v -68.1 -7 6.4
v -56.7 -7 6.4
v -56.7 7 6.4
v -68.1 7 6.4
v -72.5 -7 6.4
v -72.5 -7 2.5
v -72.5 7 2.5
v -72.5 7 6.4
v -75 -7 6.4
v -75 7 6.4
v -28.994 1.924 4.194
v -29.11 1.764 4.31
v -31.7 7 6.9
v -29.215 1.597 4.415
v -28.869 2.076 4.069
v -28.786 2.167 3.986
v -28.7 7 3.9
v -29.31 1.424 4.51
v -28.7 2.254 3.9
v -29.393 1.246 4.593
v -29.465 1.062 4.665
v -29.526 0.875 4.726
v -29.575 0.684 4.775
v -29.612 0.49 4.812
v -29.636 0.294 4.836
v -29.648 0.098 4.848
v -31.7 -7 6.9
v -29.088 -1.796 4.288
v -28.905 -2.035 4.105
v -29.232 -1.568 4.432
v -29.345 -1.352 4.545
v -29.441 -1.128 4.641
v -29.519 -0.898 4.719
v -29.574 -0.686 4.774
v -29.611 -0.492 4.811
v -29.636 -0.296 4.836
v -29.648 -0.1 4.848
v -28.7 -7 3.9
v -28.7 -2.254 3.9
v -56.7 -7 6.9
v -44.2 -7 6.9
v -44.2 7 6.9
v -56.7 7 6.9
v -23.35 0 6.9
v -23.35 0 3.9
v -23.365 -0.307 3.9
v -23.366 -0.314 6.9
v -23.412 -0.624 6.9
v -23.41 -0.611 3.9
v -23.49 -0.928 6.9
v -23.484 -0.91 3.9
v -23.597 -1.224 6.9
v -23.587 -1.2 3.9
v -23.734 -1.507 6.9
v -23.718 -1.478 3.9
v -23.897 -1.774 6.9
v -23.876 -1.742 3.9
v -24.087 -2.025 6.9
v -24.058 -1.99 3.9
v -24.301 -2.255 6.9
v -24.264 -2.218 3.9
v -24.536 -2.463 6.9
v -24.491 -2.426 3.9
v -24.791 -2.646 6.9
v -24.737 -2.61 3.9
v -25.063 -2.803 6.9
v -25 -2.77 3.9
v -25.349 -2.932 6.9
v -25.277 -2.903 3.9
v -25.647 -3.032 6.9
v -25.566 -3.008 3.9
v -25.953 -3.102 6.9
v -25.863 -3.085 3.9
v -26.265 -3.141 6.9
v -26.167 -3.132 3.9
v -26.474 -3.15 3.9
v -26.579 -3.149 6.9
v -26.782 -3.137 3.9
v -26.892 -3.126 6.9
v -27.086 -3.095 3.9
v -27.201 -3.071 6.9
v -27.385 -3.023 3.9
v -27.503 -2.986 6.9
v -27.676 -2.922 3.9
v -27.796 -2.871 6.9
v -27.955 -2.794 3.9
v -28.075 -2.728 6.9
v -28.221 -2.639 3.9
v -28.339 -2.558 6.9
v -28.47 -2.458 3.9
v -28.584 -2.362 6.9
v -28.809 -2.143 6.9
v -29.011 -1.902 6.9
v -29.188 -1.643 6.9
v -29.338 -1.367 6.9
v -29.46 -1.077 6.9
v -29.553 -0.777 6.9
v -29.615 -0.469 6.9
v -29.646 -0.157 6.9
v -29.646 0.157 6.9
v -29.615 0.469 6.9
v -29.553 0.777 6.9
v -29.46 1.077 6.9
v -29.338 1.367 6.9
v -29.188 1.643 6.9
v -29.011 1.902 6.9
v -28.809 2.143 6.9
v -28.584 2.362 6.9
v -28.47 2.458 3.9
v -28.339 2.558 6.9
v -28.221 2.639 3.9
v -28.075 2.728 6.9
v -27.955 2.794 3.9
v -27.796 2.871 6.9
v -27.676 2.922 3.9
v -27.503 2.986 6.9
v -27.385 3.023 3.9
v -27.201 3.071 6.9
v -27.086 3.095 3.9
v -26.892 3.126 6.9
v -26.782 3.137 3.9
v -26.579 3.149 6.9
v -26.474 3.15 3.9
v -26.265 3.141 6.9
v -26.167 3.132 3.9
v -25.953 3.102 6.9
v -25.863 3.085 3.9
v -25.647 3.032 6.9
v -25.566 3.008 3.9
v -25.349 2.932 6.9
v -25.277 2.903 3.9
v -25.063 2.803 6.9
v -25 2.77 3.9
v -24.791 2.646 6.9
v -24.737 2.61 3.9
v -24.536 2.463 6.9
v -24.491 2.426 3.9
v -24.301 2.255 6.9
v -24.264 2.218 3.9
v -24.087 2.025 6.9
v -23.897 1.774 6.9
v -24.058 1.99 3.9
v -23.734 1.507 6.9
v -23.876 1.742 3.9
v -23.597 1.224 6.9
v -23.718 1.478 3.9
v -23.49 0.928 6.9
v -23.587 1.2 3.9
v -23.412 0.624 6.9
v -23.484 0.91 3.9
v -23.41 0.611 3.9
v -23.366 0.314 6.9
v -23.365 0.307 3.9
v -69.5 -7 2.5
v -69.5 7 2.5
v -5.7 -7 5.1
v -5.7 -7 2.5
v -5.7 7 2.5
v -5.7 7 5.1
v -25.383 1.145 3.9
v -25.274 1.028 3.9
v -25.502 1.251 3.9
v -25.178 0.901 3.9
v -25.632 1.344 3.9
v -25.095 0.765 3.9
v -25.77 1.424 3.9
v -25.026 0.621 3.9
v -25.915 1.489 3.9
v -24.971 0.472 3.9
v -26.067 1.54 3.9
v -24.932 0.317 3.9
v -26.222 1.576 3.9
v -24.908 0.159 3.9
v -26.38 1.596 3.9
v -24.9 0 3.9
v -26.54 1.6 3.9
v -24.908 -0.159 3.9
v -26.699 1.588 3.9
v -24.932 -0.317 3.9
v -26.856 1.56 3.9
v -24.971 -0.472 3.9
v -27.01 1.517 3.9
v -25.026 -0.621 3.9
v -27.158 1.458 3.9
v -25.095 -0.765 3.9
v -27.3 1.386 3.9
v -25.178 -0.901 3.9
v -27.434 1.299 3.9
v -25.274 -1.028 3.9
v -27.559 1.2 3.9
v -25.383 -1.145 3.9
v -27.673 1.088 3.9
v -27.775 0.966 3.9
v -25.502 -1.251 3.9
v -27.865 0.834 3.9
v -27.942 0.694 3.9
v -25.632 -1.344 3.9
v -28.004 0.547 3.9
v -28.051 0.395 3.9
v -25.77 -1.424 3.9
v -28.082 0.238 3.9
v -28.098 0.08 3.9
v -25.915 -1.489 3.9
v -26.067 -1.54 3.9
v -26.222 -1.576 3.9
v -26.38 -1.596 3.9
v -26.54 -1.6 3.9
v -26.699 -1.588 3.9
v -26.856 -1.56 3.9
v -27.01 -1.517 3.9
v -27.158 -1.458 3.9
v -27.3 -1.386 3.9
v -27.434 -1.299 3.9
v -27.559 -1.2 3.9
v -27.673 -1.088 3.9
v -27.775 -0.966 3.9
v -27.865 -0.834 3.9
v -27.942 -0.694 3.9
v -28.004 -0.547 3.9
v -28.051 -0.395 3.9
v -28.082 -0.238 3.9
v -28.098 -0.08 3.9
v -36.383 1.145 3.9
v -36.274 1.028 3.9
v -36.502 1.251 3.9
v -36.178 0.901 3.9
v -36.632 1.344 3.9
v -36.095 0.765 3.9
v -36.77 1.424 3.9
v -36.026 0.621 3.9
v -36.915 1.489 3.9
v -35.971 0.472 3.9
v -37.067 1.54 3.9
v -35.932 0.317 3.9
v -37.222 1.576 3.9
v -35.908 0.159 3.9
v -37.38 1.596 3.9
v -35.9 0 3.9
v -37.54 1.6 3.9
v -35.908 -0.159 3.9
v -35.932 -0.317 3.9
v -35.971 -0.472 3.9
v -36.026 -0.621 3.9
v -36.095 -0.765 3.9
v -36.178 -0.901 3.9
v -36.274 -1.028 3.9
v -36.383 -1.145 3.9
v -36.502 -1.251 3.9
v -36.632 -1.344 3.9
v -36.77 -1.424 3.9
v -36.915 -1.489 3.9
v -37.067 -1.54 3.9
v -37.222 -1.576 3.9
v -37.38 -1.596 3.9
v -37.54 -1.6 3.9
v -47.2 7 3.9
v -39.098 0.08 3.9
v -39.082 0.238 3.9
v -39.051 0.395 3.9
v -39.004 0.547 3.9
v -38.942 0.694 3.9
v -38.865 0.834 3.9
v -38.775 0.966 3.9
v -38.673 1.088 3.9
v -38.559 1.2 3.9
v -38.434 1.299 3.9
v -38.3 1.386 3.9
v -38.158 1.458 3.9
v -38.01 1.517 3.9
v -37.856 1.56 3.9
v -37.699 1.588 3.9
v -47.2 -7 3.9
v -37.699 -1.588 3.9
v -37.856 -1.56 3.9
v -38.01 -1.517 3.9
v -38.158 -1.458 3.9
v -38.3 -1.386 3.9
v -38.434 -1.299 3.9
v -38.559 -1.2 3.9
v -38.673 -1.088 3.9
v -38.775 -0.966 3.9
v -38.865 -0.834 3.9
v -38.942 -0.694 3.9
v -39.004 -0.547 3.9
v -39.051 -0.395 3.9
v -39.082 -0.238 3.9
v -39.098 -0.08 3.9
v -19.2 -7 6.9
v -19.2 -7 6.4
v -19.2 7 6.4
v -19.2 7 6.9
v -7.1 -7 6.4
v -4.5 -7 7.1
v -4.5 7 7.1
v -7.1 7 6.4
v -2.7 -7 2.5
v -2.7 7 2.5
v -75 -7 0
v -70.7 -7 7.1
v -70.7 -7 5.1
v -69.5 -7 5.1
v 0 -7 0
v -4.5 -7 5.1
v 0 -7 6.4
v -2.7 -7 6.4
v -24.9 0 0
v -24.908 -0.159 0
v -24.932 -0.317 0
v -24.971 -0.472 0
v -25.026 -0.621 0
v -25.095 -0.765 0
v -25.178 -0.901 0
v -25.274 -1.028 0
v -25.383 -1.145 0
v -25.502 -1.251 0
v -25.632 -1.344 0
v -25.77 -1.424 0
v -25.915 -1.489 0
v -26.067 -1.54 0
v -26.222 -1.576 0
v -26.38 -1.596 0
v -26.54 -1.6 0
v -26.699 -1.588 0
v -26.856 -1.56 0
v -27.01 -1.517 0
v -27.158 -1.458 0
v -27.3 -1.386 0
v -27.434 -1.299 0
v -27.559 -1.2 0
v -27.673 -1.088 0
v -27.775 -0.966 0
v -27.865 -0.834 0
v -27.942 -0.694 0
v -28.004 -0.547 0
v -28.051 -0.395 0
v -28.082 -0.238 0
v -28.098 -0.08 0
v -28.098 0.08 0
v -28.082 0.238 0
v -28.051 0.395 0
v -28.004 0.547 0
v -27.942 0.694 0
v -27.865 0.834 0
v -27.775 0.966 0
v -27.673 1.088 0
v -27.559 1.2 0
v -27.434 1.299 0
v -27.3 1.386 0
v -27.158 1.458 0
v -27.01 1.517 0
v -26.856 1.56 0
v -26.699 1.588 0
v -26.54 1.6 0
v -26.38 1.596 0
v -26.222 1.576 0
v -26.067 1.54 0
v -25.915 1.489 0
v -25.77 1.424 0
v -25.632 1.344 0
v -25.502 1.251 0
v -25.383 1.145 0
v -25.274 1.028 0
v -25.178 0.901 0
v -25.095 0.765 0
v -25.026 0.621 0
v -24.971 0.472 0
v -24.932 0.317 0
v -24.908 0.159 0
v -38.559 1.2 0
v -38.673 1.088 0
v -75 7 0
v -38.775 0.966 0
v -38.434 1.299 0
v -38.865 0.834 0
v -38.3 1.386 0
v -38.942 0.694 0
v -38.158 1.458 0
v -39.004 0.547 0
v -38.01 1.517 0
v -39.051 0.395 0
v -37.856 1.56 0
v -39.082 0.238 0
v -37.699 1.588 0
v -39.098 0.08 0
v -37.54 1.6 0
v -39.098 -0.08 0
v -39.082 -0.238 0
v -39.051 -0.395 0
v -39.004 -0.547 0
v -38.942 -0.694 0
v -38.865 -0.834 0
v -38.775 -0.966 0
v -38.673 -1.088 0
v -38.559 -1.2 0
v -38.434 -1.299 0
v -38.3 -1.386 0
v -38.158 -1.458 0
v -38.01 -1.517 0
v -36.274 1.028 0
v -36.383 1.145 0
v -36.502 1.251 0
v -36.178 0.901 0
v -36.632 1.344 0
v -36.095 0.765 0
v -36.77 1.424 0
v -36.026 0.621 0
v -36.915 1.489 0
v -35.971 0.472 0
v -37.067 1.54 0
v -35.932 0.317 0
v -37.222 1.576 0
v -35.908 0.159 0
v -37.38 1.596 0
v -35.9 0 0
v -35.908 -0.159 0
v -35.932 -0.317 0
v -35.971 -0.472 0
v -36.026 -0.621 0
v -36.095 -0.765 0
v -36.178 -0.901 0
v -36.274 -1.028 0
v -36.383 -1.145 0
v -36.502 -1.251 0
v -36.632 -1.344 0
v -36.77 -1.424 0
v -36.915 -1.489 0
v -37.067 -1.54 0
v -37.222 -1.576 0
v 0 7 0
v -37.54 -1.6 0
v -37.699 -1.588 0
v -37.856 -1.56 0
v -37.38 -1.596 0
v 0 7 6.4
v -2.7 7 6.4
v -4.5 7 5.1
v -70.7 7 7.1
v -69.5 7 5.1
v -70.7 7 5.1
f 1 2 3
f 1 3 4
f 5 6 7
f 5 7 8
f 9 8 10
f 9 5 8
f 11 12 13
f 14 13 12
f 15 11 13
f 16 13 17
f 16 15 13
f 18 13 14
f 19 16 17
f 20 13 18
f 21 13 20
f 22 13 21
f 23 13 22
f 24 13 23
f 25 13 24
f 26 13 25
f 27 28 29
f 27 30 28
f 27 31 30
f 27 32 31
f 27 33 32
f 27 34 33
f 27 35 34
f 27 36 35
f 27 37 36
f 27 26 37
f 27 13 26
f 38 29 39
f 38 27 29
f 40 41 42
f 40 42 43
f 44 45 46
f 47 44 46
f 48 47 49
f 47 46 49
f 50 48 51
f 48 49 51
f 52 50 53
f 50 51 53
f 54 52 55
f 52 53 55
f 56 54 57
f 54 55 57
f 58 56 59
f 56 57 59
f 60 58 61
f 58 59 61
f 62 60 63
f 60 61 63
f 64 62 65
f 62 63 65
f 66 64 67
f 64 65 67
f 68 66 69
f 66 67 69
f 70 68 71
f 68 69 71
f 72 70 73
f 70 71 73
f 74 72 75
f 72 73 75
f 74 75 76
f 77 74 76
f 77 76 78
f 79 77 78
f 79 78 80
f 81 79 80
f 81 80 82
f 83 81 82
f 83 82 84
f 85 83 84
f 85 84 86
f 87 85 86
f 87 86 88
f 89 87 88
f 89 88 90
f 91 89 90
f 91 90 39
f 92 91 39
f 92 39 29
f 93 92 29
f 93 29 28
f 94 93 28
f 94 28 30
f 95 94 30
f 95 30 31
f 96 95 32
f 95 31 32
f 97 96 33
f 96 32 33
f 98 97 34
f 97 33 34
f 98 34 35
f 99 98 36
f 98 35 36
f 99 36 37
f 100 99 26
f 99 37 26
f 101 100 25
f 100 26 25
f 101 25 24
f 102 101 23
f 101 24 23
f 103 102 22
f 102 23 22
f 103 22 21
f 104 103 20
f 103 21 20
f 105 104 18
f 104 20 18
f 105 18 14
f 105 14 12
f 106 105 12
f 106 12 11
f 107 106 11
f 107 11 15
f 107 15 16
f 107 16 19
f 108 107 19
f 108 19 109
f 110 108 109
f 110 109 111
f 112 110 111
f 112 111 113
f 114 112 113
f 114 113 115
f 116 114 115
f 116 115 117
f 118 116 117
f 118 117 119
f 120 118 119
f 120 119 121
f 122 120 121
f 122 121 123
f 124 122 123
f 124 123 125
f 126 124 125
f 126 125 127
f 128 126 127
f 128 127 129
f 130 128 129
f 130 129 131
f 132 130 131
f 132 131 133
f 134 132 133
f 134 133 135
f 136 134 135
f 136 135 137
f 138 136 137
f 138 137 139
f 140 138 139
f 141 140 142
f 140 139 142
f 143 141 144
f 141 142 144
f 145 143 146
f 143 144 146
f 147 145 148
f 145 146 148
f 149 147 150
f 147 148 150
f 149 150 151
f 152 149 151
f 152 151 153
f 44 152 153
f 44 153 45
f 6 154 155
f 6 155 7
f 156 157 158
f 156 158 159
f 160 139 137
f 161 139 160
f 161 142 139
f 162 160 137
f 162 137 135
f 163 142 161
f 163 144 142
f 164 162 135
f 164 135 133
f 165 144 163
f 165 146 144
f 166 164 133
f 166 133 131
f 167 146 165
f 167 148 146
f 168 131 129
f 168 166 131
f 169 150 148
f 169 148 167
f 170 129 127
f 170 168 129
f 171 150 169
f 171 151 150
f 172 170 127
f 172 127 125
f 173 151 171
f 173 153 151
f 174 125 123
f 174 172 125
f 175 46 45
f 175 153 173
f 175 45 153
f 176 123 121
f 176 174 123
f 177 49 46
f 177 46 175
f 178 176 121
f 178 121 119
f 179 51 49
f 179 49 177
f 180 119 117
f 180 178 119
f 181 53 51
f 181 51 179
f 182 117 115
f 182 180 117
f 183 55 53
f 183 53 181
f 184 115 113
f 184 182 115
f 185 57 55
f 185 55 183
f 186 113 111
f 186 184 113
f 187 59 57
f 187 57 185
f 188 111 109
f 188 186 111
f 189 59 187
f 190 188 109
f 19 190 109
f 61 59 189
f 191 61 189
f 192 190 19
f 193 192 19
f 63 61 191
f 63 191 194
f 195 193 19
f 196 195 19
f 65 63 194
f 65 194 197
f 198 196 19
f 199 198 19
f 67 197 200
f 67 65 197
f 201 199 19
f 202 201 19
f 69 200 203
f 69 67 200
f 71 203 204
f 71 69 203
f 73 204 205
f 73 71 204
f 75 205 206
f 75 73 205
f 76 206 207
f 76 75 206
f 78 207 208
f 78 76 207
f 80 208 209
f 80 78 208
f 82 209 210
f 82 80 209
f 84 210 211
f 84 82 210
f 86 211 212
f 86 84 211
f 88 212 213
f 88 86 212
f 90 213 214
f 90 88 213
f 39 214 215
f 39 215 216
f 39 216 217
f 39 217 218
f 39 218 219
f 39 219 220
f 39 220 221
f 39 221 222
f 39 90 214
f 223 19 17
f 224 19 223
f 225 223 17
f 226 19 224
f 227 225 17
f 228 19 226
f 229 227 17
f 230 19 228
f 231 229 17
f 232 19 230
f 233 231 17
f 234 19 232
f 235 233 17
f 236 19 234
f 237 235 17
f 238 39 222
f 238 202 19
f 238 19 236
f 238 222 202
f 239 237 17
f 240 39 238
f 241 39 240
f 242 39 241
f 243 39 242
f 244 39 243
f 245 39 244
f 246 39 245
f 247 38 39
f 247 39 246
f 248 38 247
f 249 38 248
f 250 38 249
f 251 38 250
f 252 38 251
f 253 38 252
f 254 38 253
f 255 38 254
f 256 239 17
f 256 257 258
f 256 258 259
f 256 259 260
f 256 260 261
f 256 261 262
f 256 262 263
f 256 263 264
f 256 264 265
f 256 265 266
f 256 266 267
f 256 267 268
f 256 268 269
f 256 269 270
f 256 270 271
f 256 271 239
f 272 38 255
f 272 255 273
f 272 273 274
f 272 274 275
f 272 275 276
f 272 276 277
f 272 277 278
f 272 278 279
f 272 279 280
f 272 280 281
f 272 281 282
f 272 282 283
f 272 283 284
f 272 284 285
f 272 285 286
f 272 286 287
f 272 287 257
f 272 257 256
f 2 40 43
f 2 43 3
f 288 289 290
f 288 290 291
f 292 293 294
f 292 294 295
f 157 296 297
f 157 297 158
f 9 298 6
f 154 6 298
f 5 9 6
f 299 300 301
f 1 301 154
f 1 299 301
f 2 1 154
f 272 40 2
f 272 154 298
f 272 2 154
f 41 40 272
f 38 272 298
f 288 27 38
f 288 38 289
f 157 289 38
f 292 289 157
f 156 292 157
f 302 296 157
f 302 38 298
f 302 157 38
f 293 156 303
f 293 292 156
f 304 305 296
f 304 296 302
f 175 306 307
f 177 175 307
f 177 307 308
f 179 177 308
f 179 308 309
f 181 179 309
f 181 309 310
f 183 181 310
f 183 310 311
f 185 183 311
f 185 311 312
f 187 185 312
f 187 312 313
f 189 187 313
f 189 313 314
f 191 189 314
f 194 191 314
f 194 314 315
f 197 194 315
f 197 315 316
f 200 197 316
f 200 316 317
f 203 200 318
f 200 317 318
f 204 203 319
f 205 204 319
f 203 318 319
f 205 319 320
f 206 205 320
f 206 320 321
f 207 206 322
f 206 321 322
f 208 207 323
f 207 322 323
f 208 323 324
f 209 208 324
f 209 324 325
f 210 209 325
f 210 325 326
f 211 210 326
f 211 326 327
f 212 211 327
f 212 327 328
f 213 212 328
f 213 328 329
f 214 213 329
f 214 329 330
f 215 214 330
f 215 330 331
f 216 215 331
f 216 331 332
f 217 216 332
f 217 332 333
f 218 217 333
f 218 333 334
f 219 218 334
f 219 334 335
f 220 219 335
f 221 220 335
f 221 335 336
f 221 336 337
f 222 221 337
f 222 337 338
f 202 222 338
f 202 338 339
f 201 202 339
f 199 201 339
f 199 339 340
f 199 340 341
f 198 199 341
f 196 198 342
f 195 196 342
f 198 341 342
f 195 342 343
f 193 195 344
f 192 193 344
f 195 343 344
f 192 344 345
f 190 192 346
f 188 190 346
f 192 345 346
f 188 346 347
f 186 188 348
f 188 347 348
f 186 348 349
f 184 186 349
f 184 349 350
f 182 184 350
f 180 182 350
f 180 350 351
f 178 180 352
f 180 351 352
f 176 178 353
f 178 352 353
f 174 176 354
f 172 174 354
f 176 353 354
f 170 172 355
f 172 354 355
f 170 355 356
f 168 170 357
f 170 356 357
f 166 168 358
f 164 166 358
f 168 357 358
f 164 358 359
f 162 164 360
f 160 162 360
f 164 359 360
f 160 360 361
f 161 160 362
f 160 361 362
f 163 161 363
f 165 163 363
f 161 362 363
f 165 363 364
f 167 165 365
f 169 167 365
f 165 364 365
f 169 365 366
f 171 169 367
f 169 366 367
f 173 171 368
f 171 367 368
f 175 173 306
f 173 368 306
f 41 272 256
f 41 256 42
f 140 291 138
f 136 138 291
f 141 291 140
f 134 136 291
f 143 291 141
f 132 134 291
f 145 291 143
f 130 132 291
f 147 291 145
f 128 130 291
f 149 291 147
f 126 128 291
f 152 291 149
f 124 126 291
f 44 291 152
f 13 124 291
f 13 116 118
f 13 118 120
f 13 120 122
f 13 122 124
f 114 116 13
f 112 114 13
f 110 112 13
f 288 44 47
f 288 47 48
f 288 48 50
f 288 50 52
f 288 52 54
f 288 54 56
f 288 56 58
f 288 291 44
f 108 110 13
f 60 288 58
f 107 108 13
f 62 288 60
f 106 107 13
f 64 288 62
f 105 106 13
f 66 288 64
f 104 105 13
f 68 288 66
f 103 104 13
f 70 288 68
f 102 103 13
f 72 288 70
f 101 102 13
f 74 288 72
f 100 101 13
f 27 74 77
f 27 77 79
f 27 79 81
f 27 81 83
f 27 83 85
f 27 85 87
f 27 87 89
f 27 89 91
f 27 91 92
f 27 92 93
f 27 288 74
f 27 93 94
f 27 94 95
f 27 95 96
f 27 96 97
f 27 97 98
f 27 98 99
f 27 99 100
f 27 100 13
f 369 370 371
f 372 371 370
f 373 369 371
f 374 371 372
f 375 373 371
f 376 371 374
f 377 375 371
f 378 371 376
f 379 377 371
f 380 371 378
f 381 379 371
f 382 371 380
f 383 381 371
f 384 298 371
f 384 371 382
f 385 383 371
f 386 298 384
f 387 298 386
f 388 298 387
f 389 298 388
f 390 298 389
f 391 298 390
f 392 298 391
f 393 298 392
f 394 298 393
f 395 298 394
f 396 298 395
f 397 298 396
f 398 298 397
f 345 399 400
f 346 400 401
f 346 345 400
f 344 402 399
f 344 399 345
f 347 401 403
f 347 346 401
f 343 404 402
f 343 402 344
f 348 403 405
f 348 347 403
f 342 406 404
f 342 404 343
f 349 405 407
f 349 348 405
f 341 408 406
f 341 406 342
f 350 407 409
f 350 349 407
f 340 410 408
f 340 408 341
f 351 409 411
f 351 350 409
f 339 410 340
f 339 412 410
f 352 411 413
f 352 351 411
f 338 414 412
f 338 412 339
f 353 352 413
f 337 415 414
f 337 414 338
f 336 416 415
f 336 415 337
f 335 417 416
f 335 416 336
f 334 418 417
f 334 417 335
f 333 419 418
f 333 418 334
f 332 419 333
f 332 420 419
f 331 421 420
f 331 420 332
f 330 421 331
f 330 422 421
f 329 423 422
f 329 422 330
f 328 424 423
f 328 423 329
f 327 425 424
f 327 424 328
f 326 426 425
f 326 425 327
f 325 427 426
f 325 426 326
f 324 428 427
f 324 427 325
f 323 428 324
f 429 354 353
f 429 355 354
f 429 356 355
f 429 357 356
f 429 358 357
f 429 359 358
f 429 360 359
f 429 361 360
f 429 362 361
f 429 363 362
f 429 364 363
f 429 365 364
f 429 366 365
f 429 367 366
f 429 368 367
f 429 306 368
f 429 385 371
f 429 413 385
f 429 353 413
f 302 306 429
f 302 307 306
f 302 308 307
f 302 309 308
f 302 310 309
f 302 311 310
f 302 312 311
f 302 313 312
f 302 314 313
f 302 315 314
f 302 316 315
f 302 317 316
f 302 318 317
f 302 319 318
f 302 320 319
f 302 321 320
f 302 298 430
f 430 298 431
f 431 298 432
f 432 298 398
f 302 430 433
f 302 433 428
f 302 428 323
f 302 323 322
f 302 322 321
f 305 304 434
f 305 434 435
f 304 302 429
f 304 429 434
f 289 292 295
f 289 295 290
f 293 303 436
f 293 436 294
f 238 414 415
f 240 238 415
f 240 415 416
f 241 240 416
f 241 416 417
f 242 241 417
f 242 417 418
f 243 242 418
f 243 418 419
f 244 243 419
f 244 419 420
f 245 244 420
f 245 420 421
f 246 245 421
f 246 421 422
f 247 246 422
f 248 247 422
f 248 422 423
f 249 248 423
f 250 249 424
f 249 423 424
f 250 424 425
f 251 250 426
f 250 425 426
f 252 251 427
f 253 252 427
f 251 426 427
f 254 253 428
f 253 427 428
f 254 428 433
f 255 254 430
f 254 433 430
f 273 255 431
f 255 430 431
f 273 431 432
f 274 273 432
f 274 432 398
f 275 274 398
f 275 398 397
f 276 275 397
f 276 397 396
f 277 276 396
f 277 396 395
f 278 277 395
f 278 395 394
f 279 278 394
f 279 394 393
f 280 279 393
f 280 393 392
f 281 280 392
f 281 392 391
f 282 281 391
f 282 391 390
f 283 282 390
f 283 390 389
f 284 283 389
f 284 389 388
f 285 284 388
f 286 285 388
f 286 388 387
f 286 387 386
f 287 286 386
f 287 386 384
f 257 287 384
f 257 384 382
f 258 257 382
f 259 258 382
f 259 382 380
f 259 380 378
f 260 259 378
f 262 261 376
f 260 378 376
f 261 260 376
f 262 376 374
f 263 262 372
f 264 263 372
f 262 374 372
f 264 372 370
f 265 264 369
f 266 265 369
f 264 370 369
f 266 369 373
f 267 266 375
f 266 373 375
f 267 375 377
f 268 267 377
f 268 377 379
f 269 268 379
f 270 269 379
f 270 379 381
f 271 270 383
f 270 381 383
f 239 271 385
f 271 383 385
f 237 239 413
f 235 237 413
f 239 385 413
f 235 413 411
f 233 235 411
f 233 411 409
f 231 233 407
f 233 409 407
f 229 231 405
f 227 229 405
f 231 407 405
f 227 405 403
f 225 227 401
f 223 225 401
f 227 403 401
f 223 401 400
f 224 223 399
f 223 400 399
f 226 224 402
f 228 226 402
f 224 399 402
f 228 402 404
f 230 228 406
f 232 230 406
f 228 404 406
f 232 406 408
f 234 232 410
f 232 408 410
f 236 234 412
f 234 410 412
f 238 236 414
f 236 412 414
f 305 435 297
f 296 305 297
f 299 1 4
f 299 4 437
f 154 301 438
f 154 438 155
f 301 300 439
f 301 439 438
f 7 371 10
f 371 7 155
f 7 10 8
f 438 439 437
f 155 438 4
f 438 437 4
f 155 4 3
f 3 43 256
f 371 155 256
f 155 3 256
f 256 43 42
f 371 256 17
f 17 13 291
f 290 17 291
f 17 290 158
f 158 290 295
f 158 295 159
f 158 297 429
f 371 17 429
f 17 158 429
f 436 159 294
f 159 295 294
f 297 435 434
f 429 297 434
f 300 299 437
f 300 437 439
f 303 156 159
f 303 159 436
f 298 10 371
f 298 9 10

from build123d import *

# Parameters (mm, degrees)
F1_DEPTH = 7
F2_R     = 1.6
F3_DEPTH = 25
F4_START = -3.9
F2_R_2   = 3.15
F4_DEPTH = 21.1


with BuildPart() as f1:
    # F0 (on Front) → F1 (new body, symmetric)
    with BuildSketch(Plane.XZ):
        Polygon((-75, 0), (0, 0), (0, 6.4), (-2.7, 6.4), (-2.7, 2.5), (-5.7, 2.5), (-5.7, 5.1), (-4.5, 5.1), (-4.5, 6.4), (-4.5, 7.1), (-7.1, 6.4), (-19.2, 6.4), (-19.2, 6.9), (-31.7, 6.9), (-31.2, 6.4), (-28.7, 3.9), (-47.2, 3.9), (-44.7, 6.4), (-44.2, 6.9), (-56.7, 6.9), (-56.7, 6.4), (-68.1, 6.4), (-70.7, 7.1), (-70.7, 6.4), (-70.7, 5.1), (-69.5, 5.1), (-69.5, 2.5), (-72.5, 2.5), (-72.5, 6.4), (-75, 6.4), align=None)
    extrude(amount=F1_DEPTH, both=True)

    # F2 (on face) → F3 (cut)
    with BuildSketch(Plane(origin=(0, 0, 0), x_dir=(1, 0, 0), z_dir=(0, 0, -1))):
        with Locations((-37.5, 0)):
            Circle(F2_R)
        with Locations((-26.5, 0)):
            Circle(F2_R)
    extrude(amount=-F3_DEPTH, mode=Mode.SUBTRACT)

    # F2 (on face) → F4 (cut)
    with BuildSketch(Plane(origin=(0, 0, 0), x_dir=(1, 0, 0), z_dir=(0, 0, -1)).offset(F4_START)):
        with Locations((-26.5, 0)):
            Circle(F2_R_2)
        with Locations((-26.5, 0)):
            Circle(F2_R, mode=Mode.SUBTRACT)
    extrude(amount=-F4_DEPTH, mode=Mode.SUBTRACT)


solid = f1.part
